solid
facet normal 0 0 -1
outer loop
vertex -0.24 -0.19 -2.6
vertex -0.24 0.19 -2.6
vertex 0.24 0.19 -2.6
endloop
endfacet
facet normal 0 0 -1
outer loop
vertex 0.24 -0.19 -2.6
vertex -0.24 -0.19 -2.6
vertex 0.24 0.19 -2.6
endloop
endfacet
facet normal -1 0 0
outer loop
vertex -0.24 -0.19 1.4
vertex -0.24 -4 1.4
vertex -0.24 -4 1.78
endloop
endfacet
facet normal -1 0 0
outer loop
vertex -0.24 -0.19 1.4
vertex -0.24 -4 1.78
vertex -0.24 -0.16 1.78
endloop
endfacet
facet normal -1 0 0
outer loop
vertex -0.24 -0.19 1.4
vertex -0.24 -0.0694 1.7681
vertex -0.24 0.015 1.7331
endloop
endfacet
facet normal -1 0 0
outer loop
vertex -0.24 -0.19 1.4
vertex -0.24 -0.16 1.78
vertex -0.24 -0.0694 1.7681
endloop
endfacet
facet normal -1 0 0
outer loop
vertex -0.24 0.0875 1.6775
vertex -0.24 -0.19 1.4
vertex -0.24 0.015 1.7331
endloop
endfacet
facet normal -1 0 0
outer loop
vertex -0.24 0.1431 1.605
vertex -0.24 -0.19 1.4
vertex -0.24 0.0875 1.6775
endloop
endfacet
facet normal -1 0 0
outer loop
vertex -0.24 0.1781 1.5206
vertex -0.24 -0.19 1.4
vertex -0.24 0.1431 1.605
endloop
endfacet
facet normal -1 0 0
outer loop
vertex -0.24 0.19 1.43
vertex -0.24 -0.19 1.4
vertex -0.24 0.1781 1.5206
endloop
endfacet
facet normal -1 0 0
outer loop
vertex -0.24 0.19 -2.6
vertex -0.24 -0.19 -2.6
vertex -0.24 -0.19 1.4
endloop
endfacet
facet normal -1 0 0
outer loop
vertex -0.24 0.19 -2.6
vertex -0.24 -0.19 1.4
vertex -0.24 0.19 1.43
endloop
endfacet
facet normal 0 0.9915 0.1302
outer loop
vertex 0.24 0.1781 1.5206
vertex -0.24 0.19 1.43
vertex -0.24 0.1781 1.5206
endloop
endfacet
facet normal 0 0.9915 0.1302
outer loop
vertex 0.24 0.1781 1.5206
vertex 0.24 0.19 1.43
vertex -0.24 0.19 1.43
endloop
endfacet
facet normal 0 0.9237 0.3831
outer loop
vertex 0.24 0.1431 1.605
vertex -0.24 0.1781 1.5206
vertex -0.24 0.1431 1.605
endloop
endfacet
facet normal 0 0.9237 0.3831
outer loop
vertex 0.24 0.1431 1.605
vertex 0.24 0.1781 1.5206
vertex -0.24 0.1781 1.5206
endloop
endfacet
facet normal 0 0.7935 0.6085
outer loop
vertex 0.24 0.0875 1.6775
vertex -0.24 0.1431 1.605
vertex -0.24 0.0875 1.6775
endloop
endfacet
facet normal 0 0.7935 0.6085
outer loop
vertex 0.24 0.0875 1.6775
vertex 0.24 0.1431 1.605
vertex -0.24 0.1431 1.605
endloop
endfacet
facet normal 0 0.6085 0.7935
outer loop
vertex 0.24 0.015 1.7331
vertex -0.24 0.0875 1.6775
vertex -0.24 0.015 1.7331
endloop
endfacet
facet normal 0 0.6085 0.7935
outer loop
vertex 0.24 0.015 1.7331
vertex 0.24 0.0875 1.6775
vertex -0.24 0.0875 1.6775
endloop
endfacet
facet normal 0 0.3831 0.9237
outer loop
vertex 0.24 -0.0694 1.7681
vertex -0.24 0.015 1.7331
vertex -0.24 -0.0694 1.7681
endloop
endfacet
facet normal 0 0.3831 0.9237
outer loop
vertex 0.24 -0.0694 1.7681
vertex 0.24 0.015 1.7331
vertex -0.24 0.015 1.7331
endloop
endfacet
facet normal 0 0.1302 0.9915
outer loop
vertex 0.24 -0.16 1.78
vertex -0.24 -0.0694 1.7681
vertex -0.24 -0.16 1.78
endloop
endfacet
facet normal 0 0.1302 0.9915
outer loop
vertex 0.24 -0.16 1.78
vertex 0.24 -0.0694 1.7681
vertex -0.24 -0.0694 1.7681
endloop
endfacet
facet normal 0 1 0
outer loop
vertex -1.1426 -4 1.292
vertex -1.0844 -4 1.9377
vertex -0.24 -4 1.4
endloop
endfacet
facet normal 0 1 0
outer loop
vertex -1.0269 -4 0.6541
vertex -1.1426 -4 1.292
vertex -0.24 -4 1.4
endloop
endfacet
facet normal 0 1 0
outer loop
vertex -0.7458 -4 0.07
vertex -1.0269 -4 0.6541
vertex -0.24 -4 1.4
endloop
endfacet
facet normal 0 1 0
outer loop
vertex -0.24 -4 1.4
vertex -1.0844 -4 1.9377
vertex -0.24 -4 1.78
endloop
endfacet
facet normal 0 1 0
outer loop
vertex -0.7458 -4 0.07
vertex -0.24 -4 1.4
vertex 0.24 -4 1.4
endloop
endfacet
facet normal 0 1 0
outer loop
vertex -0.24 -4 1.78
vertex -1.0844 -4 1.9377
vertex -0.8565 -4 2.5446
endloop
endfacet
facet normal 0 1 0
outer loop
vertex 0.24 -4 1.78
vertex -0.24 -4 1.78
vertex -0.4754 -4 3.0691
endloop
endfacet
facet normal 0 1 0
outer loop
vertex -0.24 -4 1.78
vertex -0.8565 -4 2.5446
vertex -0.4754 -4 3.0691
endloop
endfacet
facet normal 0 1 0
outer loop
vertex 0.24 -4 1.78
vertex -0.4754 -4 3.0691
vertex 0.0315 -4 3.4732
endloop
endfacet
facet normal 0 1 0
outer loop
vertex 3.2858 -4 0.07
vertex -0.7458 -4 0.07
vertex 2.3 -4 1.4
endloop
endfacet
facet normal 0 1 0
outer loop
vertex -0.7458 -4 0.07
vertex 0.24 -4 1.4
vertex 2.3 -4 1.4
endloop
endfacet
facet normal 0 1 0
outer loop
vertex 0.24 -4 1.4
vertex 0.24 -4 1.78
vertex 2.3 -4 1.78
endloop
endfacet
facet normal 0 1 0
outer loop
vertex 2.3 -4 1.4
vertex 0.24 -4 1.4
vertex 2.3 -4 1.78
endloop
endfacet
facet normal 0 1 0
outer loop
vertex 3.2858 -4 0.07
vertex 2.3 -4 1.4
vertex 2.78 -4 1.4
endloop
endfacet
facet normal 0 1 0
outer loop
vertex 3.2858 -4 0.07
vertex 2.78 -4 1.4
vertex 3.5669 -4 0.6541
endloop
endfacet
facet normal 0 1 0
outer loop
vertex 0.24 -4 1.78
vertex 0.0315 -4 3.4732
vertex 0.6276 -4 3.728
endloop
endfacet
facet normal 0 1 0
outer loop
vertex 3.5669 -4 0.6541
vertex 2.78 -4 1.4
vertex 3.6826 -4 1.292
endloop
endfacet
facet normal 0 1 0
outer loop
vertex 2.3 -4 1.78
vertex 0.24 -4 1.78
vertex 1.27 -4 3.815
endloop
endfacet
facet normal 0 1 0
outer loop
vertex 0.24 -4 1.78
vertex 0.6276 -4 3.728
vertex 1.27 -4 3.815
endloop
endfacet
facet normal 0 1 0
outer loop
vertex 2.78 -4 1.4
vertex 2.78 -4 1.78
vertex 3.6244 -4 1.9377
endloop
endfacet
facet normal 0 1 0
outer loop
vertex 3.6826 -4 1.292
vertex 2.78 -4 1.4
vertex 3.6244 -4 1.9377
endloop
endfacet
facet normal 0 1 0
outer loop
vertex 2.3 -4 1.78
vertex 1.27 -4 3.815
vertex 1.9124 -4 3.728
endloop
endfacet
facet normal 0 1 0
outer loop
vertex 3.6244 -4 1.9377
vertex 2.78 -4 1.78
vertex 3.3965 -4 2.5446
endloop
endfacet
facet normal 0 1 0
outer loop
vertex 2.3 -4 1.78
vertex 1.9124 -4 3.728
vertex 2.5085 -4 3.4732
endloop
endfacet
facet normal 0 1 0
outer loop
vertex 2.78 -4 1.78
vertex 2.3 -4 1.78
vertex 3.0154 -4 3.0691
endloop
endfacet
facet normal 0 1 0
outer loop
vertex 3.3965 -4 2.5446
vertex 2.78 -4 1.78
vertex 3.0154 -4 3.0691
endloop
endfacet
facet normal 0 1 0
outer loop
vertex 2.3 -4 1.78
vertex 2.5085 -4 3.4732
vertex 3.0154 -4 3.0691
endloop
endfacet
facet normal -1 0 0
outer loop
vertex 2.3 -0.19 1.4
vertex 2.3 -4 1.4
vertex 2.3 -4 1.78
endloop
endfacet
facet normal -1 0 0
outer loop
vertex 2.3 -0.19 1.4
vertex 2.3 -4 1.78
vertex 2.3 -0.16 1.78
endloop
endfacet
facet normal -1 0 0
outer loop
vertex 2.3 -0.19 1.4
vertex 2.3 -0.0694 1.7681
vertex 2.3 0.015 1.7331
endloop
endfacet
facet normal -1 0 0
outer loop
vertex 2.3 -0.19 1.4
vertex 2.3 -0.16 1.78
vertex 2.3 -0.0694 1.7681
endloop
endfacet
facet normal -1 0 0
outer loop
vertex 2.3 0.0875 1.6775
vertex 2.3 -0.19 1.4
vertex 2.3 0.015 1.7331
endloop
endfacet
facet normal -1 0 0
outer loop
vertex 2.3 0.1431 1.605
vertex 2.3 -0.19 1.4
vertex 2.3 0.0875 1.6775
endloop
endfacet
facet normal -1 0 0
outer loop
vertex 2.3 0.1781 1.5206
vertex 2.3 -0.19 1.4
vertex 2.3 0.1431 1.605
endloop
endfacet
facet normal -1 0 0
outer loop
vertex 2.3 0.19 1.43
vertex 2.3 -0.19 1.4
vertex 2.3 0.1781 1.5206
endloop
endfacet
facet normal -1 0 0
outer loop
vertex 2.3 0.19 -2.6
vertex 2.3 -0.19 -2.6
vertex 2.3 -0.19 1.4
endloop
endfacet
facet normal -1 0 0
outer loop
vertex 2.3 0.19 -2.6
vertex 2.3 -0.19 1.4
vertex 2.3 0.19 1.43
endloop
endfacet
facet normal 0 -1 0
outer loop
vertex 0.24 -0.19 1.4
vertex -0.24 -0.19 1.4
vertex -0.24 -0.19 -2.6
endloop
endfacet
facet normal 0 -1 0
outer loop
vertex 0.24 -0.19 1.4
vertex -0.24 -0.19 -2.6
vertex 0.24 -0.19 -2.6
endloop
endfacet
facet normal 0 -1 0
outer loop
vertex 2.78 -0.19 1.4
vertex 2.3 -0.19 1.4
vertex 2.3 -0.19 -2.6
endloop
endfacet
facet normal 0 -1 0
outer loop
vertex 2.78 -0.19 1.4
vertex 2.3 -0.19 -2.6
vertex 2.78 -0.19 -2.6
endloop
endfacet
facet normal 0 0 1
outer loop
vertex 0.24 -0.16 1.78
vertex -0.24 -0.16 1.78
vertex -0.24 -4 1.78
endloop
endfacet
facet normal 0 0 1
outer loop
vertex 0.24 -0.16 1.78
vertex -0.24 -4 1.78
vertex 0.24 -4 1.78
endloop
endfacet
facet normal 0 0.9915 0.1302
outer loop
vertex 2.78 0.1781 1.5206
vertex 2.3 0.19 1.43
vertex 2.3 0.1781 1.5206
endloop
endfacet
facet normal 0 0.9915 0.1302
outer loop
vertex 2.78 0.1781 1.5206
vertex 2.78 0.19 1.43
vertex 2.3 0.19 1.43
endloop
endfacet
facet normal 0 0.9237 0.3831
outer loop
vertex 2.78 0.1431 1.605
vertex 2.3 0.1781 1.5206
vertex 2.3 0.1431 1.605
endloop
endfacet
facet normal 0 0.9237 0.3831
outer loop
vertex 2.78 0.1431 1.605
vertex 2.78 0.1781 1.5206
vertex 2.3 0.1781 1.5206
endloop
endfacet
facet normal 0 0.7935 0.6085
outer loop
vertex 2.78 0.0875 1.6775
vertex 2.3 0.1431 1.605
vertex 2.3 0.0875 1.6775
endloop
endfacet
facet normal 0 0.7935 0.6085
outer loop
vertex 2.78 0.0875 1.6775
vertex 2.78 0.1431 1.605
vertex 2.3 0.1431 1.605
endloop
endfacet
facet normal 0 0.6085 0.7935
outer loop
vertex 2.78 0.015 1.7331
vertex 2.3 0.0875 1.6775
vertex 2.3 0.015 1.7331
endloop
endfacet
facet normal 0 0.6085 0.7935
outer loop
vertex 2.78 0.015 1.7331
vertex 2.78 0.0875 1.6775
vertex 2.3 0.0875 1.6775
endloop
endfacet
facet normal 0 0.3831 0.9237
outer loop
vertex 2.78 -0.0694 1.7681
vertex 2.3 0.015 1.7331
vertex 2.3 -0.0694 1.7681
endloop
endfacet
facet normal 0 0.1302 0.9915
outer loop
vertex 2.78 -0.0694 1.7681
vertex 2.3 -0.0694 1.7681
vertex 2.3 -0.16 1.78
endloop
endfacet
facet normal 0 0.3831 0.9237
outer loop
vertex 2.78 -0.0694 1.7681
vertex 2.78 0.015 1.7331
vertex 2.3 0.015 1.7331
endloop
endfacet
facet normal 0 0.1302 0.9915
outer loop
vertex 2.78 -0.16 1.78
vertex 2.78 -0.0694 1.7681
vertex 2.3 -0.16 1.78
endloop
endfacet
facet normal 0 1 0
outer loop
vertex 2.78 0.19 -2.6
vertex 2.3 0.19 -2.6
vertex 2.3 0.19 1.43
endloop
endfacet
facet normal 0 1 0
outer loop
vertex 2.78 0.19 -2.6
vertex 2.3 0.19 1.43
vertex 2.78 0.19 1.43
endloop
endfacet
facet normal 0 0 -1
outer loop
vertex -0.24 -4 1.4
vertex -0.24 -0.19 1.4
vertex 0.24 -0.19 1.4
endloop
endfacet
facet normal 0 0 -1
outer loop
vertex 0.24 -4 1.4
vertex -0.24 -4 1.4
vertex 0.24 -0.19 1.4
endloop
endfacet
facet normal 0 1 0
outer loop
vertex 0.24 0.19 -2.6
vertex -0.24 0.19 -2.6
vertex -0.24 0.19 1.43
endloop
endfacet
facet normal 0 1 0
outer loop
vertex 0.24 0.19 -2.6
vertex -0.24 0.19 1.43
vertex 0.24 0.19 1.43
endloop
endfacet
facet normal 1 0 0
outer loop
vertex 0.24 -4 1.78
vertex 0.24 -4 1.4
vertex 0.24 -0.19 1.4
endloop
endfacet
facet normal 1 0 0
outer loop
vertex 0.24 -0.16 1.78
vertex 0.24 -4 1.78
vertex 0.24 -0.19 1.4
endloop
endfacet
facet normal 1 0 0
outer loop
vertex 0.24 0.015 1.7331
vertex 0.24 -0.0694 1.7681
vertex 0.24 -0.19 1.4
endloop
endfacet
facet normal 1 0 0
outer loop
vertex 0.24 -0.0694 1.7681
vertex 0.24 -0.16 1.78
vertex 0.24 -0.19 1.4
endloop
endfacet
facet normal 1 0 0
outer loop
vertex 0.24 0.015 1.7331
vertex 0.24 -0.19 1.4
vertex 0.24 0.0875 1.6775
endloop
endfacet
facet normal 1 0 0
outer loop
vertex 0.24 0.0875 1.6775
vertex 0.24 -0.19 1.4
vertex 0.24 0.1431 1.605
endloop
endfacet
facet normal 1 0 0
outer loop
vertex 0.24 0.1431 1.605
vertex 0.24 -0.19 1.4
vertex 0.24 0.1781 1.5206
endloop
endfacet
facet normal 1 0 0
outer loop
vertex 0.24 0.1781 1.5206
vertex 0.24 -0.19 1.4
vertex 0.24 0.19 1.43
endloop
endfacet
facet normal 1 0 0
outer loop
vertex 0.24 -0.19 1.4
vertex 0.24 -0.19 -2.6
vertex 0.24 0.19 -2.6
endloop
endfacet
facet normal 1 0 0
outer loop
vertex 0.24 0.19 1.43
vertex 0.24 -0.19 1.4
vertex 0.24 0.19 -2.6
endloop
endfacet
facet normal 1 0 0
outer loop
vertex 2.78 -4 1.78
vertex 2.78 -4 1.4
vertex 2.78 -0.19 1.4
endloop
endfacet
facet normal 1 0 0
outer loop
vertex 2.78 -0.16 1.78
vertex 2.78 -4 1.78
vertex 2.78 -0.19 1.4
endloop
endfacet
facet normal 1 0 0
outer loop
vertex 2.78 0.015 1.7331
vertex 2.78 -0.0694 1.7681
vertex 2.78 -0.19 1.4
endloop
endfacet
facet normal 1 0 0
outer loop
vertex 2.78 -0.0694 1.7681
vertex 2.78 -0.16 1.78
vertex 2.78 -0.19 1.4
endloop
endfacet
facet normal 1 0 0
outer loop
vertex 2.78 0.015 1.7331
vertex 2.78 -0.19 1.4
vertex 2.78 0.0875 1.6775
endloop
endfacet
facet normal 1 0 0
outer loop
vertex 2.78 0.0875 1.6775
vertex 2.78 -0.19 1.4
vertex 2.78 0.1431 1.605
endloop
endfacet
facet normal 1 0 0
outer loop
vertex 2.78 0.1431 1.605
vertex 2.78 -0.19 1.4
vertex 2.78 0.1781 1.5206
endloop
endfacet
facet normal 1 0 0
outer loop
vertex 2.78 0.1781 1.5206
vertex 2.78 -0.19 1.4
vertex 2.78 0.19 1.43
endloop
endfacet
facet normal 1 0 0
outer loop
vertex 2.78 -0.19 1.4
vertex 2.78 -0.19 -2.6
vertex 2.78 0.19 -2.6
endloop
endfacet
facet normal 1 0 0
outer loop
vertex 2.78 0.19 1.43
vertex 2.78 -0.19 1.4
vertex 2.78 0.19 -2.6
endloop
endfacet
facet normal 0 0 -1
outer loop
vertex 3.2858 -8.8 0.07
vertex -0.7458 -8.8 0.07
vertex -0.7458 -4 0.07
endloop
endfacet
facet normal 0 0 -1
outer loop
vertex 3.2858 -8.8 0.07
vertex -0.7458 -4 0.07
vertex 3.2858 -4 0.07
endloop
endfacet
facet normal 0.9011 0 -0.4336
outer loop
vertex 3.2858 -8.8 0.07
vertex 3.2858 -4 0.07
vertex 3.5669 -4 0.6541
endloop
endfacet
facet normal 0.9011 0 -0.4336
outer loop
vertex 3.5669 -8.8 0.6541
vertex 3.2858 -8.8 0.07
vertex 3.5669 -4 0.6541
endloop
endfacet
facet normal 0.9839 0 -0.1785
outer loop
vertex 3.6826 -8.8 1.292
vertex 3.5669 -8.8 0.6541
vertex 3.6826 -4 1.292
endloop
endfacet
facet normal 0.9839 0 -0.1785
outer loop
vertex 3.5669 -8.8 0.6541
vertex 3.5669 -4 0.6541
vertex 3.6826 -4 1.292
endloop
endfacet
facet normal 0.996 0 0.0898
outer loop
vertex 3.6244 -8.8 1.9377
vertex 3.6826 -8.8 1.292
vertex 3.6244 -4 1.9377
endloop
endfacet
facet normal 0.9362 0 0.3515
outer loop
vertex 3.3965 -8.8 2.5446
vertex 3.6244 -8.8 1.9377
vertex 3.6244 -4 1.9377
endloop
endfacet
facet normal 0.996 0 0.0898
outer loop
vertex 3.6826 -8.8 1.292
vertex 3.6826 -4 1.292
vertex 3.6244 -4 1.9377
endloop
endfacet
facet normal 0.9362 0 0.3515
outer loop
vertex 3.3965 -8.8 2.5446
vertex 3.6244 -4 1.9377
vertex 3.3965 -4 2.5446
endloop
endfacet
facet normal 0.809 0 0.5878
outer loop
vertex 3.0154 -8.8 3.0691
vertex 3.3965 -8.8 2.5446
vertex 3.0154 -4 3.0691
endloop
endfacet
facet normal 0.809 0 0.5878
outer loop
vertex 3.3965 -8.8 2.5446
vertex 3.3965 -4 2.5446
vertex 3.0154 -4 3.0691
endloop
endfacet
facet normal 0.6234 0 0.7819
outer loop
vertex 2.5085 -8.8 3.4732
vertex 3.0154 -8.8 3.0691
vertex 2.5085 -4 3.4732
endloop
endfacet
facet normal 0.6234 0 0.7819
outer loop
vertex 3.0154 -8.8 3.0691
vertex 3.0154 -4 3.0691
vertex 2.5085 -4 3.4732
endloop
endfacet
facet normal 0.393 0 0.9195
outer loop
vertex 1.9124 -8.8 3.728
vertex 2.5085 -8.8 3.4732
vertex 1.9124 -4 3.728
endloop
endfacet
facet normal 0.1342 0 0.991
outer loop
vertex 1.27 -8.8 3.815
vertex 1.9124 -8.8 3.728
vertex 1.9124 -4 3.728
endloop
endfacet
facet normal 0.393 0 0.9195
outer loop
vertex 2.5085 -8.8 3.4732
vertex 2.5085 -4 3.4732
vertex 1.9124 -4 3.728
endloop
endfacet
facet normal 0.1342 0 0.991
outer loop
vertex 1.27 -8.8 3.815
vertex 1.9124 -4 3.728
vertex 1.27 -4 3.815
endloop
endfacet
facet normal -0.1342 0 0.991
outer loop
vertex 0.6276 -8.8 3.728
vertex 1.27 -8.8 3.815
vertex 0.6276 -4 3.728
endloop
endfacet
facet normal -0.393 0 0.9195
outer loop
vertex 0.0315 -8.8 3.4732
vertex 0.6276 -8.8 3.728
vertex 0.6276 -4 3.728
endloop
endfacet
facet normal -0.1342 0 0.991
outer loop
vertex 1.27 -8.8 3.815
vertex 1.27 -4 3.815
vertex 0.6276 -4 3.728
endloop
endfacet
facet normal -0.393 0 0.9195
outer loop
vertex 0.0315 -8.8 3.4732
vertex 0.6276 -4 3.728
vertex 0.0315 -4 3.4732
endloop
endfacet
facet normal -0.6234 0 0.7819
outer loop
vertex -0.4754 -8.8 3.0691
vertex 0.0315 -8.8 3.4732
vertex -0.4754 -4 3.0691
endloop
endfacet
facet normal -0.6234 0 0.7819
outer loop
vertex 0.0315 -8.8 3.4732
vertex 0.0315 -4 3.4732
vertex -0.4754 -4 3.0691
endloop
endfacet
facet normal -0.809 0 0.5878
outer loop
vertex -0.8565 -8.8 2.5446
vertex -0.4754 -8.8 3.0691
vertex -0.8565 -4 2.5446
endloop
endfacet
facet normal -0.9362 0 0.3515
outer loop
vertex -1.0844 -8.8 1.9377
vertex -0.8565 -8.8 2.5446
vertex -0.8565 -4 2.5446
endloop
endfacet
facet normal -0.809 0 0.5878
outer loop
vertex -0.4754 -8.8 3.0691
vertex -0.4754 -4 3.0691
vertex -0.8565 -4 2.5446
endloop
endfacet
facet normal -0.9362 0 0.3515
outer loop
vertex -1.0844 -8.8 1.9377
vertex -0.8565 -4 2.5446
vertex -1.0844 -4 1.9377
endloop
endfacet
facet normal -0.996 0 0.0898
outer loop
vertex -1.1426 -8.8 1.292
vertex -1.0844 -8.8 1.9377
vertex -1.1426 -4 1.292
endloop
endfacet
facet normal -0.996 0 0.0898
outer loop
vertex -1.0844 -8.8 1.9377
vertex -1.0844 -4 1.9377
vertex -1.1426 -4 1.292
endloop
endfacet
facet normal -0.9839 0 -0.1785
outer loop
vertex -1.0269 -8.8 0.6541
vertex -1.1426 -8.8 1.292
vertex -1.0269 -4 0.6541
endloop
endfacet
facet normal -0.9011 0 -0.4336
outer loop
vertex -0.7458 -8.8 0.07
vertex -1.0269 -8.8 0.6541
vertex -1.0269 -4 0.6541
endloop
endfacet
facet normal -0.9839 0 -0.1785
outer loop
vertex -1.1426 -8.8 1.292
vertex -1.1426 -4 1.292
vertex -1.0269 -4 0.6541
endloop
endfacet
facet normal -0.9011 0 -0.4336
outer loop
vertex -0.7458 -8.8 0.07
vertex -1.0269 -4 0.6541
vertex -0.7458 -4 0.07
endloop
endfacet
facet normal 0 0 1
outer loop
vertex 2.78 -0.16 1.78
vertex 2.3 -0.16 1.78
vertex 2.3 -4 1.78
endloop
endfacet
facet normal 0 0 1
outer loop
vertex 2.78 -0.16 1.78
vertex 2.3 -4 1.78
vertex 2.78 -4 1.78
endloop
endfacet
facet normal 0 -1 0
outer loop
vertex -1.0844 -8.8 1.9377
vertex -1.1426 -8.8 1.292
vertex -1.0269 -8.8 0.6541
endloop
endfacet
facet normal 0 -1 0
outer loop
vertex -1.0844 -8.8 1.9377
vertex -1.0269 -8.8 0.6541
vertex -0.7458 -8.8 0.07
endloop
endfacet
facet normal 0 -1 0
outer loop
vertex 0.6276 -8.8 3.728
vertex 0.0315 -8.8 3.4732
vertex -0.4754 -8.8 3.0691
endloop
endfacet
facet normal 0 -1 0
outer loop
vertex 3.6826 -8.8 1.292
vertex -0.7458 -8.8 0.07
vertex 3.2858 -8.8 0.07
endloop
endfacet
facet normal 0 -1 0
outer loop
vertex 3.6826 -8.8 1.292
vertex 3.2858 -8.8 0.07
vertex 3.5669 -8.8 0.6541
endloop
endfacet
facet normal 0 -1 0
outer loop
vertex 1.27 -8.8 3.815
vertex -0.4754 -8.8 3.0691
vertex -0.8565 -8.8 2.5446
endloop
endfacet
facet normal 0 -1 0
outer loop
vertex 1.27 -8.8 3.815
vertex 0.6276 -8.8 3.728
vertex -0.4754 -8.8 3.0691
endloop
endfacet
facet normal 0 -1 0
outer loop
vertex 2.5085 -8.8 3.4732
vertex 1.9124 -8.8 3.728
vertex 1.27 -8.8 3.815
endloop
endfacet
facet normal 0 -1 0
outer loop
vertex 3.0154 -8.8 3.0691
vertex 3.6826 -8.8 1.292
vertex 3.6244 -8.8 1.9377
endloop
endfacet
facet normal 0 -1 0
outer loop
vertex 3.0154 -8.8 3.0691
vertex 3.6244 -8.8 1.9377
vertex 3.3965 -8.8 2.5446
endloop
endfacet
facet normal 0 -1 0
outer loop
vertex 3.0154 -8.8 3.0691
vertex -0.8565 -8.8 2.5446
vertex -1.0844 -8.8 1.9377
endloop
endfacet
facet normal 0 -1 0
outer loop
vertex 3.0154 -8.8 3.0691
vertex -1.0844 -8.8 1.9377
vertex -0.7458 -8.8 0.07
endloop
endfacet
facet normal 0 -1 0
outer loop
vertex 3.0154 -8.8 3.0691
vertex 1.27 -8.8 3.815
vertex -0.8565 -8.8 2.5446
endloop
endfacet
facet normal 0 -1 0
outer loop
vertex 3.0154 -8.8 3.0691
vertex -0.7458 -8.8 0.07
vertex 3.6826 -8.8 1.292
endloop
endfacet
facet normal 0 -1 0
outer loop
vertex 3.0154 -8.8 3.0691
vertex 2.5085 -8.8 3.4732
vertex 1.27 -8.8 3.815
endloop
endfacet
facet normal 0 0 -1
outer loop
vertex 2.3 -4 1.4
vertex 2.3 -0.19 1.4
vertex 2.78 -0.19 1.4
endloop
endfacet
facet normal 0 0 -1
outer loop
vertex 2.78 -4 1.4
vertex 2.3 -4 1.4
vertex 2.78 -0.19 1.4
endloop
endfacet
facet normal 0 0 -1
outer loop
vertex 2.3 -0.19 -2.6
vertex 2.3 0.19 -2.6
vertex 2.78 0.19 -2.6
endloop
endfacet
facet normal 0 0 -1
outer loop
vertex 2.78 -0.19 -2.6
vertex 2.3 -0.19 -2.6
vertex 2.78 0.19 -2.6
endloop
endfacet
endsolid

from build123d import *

# Parameters (mm, degrees)
PAD_DEPTH    = 4.8
SKETCH002_W  = 0.48
SKETCH002_H  = 4.3
PAD002_DEPTH = 0.38
FILLET_R     = 0.35
SKETCH001_W  = 0.48
SKETCH001_H  = 0.38
PAD001_DEPTH = 4


with BuildPart() as pad:
    # Sketch → Pad (new body)
    with BuildSketch(Plane(origin=(0, -4, 1.4), x_dir=(1, 0, 0), z_dir=(0, -1, 0))):
        with BuildLine():
            Line((-0.745769, -1.33), (3.285769, -1.33))
            ThreePointArc((3.285769, -1.33), (1.27, 2.415), (-0.745769, -1.33))
        make_face()
    extrude(amount=PAD_DEPTH)


with BuildPart() as fillet_body:
    # Sketch002 → Pad002 (new body)
    with BuildSketch(Plane.XY.offset(1.4)):
        with Locations((2.54, -1.96)):
            Rectangle(SKETCH002_W, SKETCH002_H)
        with Locations((0, -1.96)):
            Rectangle(SKETCH002_W, SKETCH002_H)
    extrude(amount=PAD002_DEPTH)

    # Fillet
    fillet_edges = [fillet_body.edges().sort_by_distance(p)[0] for p in [
        (2.54, 0.19, 1.78),
        (0, 0.19, 1.78),
    ]]
    fillet(fillet_edges, radius=FILLET_R)


with BuildPart() as to_92_2_w4_0mm_horizontal_flatsidedown:
    # Sketch001 → Pad001 (new body)
    with BuildSketch(Plane.XY.offset(1.4)):
        Rectangle(SKETCH001_W, SKETCH001_H)
        with Locations((2.54, 0)):
            Rectangle(SKETCH001_W, SKETCH001_H)
    extrude(amount=-PAD001_DEPTH)

    # Pad001_mp_cp: union Pad, Fillet body
    add(pad.part)
    add(fillet_body.part)


solid = to_92_2_w4_0mm_horizontal_flatsidedown.part
